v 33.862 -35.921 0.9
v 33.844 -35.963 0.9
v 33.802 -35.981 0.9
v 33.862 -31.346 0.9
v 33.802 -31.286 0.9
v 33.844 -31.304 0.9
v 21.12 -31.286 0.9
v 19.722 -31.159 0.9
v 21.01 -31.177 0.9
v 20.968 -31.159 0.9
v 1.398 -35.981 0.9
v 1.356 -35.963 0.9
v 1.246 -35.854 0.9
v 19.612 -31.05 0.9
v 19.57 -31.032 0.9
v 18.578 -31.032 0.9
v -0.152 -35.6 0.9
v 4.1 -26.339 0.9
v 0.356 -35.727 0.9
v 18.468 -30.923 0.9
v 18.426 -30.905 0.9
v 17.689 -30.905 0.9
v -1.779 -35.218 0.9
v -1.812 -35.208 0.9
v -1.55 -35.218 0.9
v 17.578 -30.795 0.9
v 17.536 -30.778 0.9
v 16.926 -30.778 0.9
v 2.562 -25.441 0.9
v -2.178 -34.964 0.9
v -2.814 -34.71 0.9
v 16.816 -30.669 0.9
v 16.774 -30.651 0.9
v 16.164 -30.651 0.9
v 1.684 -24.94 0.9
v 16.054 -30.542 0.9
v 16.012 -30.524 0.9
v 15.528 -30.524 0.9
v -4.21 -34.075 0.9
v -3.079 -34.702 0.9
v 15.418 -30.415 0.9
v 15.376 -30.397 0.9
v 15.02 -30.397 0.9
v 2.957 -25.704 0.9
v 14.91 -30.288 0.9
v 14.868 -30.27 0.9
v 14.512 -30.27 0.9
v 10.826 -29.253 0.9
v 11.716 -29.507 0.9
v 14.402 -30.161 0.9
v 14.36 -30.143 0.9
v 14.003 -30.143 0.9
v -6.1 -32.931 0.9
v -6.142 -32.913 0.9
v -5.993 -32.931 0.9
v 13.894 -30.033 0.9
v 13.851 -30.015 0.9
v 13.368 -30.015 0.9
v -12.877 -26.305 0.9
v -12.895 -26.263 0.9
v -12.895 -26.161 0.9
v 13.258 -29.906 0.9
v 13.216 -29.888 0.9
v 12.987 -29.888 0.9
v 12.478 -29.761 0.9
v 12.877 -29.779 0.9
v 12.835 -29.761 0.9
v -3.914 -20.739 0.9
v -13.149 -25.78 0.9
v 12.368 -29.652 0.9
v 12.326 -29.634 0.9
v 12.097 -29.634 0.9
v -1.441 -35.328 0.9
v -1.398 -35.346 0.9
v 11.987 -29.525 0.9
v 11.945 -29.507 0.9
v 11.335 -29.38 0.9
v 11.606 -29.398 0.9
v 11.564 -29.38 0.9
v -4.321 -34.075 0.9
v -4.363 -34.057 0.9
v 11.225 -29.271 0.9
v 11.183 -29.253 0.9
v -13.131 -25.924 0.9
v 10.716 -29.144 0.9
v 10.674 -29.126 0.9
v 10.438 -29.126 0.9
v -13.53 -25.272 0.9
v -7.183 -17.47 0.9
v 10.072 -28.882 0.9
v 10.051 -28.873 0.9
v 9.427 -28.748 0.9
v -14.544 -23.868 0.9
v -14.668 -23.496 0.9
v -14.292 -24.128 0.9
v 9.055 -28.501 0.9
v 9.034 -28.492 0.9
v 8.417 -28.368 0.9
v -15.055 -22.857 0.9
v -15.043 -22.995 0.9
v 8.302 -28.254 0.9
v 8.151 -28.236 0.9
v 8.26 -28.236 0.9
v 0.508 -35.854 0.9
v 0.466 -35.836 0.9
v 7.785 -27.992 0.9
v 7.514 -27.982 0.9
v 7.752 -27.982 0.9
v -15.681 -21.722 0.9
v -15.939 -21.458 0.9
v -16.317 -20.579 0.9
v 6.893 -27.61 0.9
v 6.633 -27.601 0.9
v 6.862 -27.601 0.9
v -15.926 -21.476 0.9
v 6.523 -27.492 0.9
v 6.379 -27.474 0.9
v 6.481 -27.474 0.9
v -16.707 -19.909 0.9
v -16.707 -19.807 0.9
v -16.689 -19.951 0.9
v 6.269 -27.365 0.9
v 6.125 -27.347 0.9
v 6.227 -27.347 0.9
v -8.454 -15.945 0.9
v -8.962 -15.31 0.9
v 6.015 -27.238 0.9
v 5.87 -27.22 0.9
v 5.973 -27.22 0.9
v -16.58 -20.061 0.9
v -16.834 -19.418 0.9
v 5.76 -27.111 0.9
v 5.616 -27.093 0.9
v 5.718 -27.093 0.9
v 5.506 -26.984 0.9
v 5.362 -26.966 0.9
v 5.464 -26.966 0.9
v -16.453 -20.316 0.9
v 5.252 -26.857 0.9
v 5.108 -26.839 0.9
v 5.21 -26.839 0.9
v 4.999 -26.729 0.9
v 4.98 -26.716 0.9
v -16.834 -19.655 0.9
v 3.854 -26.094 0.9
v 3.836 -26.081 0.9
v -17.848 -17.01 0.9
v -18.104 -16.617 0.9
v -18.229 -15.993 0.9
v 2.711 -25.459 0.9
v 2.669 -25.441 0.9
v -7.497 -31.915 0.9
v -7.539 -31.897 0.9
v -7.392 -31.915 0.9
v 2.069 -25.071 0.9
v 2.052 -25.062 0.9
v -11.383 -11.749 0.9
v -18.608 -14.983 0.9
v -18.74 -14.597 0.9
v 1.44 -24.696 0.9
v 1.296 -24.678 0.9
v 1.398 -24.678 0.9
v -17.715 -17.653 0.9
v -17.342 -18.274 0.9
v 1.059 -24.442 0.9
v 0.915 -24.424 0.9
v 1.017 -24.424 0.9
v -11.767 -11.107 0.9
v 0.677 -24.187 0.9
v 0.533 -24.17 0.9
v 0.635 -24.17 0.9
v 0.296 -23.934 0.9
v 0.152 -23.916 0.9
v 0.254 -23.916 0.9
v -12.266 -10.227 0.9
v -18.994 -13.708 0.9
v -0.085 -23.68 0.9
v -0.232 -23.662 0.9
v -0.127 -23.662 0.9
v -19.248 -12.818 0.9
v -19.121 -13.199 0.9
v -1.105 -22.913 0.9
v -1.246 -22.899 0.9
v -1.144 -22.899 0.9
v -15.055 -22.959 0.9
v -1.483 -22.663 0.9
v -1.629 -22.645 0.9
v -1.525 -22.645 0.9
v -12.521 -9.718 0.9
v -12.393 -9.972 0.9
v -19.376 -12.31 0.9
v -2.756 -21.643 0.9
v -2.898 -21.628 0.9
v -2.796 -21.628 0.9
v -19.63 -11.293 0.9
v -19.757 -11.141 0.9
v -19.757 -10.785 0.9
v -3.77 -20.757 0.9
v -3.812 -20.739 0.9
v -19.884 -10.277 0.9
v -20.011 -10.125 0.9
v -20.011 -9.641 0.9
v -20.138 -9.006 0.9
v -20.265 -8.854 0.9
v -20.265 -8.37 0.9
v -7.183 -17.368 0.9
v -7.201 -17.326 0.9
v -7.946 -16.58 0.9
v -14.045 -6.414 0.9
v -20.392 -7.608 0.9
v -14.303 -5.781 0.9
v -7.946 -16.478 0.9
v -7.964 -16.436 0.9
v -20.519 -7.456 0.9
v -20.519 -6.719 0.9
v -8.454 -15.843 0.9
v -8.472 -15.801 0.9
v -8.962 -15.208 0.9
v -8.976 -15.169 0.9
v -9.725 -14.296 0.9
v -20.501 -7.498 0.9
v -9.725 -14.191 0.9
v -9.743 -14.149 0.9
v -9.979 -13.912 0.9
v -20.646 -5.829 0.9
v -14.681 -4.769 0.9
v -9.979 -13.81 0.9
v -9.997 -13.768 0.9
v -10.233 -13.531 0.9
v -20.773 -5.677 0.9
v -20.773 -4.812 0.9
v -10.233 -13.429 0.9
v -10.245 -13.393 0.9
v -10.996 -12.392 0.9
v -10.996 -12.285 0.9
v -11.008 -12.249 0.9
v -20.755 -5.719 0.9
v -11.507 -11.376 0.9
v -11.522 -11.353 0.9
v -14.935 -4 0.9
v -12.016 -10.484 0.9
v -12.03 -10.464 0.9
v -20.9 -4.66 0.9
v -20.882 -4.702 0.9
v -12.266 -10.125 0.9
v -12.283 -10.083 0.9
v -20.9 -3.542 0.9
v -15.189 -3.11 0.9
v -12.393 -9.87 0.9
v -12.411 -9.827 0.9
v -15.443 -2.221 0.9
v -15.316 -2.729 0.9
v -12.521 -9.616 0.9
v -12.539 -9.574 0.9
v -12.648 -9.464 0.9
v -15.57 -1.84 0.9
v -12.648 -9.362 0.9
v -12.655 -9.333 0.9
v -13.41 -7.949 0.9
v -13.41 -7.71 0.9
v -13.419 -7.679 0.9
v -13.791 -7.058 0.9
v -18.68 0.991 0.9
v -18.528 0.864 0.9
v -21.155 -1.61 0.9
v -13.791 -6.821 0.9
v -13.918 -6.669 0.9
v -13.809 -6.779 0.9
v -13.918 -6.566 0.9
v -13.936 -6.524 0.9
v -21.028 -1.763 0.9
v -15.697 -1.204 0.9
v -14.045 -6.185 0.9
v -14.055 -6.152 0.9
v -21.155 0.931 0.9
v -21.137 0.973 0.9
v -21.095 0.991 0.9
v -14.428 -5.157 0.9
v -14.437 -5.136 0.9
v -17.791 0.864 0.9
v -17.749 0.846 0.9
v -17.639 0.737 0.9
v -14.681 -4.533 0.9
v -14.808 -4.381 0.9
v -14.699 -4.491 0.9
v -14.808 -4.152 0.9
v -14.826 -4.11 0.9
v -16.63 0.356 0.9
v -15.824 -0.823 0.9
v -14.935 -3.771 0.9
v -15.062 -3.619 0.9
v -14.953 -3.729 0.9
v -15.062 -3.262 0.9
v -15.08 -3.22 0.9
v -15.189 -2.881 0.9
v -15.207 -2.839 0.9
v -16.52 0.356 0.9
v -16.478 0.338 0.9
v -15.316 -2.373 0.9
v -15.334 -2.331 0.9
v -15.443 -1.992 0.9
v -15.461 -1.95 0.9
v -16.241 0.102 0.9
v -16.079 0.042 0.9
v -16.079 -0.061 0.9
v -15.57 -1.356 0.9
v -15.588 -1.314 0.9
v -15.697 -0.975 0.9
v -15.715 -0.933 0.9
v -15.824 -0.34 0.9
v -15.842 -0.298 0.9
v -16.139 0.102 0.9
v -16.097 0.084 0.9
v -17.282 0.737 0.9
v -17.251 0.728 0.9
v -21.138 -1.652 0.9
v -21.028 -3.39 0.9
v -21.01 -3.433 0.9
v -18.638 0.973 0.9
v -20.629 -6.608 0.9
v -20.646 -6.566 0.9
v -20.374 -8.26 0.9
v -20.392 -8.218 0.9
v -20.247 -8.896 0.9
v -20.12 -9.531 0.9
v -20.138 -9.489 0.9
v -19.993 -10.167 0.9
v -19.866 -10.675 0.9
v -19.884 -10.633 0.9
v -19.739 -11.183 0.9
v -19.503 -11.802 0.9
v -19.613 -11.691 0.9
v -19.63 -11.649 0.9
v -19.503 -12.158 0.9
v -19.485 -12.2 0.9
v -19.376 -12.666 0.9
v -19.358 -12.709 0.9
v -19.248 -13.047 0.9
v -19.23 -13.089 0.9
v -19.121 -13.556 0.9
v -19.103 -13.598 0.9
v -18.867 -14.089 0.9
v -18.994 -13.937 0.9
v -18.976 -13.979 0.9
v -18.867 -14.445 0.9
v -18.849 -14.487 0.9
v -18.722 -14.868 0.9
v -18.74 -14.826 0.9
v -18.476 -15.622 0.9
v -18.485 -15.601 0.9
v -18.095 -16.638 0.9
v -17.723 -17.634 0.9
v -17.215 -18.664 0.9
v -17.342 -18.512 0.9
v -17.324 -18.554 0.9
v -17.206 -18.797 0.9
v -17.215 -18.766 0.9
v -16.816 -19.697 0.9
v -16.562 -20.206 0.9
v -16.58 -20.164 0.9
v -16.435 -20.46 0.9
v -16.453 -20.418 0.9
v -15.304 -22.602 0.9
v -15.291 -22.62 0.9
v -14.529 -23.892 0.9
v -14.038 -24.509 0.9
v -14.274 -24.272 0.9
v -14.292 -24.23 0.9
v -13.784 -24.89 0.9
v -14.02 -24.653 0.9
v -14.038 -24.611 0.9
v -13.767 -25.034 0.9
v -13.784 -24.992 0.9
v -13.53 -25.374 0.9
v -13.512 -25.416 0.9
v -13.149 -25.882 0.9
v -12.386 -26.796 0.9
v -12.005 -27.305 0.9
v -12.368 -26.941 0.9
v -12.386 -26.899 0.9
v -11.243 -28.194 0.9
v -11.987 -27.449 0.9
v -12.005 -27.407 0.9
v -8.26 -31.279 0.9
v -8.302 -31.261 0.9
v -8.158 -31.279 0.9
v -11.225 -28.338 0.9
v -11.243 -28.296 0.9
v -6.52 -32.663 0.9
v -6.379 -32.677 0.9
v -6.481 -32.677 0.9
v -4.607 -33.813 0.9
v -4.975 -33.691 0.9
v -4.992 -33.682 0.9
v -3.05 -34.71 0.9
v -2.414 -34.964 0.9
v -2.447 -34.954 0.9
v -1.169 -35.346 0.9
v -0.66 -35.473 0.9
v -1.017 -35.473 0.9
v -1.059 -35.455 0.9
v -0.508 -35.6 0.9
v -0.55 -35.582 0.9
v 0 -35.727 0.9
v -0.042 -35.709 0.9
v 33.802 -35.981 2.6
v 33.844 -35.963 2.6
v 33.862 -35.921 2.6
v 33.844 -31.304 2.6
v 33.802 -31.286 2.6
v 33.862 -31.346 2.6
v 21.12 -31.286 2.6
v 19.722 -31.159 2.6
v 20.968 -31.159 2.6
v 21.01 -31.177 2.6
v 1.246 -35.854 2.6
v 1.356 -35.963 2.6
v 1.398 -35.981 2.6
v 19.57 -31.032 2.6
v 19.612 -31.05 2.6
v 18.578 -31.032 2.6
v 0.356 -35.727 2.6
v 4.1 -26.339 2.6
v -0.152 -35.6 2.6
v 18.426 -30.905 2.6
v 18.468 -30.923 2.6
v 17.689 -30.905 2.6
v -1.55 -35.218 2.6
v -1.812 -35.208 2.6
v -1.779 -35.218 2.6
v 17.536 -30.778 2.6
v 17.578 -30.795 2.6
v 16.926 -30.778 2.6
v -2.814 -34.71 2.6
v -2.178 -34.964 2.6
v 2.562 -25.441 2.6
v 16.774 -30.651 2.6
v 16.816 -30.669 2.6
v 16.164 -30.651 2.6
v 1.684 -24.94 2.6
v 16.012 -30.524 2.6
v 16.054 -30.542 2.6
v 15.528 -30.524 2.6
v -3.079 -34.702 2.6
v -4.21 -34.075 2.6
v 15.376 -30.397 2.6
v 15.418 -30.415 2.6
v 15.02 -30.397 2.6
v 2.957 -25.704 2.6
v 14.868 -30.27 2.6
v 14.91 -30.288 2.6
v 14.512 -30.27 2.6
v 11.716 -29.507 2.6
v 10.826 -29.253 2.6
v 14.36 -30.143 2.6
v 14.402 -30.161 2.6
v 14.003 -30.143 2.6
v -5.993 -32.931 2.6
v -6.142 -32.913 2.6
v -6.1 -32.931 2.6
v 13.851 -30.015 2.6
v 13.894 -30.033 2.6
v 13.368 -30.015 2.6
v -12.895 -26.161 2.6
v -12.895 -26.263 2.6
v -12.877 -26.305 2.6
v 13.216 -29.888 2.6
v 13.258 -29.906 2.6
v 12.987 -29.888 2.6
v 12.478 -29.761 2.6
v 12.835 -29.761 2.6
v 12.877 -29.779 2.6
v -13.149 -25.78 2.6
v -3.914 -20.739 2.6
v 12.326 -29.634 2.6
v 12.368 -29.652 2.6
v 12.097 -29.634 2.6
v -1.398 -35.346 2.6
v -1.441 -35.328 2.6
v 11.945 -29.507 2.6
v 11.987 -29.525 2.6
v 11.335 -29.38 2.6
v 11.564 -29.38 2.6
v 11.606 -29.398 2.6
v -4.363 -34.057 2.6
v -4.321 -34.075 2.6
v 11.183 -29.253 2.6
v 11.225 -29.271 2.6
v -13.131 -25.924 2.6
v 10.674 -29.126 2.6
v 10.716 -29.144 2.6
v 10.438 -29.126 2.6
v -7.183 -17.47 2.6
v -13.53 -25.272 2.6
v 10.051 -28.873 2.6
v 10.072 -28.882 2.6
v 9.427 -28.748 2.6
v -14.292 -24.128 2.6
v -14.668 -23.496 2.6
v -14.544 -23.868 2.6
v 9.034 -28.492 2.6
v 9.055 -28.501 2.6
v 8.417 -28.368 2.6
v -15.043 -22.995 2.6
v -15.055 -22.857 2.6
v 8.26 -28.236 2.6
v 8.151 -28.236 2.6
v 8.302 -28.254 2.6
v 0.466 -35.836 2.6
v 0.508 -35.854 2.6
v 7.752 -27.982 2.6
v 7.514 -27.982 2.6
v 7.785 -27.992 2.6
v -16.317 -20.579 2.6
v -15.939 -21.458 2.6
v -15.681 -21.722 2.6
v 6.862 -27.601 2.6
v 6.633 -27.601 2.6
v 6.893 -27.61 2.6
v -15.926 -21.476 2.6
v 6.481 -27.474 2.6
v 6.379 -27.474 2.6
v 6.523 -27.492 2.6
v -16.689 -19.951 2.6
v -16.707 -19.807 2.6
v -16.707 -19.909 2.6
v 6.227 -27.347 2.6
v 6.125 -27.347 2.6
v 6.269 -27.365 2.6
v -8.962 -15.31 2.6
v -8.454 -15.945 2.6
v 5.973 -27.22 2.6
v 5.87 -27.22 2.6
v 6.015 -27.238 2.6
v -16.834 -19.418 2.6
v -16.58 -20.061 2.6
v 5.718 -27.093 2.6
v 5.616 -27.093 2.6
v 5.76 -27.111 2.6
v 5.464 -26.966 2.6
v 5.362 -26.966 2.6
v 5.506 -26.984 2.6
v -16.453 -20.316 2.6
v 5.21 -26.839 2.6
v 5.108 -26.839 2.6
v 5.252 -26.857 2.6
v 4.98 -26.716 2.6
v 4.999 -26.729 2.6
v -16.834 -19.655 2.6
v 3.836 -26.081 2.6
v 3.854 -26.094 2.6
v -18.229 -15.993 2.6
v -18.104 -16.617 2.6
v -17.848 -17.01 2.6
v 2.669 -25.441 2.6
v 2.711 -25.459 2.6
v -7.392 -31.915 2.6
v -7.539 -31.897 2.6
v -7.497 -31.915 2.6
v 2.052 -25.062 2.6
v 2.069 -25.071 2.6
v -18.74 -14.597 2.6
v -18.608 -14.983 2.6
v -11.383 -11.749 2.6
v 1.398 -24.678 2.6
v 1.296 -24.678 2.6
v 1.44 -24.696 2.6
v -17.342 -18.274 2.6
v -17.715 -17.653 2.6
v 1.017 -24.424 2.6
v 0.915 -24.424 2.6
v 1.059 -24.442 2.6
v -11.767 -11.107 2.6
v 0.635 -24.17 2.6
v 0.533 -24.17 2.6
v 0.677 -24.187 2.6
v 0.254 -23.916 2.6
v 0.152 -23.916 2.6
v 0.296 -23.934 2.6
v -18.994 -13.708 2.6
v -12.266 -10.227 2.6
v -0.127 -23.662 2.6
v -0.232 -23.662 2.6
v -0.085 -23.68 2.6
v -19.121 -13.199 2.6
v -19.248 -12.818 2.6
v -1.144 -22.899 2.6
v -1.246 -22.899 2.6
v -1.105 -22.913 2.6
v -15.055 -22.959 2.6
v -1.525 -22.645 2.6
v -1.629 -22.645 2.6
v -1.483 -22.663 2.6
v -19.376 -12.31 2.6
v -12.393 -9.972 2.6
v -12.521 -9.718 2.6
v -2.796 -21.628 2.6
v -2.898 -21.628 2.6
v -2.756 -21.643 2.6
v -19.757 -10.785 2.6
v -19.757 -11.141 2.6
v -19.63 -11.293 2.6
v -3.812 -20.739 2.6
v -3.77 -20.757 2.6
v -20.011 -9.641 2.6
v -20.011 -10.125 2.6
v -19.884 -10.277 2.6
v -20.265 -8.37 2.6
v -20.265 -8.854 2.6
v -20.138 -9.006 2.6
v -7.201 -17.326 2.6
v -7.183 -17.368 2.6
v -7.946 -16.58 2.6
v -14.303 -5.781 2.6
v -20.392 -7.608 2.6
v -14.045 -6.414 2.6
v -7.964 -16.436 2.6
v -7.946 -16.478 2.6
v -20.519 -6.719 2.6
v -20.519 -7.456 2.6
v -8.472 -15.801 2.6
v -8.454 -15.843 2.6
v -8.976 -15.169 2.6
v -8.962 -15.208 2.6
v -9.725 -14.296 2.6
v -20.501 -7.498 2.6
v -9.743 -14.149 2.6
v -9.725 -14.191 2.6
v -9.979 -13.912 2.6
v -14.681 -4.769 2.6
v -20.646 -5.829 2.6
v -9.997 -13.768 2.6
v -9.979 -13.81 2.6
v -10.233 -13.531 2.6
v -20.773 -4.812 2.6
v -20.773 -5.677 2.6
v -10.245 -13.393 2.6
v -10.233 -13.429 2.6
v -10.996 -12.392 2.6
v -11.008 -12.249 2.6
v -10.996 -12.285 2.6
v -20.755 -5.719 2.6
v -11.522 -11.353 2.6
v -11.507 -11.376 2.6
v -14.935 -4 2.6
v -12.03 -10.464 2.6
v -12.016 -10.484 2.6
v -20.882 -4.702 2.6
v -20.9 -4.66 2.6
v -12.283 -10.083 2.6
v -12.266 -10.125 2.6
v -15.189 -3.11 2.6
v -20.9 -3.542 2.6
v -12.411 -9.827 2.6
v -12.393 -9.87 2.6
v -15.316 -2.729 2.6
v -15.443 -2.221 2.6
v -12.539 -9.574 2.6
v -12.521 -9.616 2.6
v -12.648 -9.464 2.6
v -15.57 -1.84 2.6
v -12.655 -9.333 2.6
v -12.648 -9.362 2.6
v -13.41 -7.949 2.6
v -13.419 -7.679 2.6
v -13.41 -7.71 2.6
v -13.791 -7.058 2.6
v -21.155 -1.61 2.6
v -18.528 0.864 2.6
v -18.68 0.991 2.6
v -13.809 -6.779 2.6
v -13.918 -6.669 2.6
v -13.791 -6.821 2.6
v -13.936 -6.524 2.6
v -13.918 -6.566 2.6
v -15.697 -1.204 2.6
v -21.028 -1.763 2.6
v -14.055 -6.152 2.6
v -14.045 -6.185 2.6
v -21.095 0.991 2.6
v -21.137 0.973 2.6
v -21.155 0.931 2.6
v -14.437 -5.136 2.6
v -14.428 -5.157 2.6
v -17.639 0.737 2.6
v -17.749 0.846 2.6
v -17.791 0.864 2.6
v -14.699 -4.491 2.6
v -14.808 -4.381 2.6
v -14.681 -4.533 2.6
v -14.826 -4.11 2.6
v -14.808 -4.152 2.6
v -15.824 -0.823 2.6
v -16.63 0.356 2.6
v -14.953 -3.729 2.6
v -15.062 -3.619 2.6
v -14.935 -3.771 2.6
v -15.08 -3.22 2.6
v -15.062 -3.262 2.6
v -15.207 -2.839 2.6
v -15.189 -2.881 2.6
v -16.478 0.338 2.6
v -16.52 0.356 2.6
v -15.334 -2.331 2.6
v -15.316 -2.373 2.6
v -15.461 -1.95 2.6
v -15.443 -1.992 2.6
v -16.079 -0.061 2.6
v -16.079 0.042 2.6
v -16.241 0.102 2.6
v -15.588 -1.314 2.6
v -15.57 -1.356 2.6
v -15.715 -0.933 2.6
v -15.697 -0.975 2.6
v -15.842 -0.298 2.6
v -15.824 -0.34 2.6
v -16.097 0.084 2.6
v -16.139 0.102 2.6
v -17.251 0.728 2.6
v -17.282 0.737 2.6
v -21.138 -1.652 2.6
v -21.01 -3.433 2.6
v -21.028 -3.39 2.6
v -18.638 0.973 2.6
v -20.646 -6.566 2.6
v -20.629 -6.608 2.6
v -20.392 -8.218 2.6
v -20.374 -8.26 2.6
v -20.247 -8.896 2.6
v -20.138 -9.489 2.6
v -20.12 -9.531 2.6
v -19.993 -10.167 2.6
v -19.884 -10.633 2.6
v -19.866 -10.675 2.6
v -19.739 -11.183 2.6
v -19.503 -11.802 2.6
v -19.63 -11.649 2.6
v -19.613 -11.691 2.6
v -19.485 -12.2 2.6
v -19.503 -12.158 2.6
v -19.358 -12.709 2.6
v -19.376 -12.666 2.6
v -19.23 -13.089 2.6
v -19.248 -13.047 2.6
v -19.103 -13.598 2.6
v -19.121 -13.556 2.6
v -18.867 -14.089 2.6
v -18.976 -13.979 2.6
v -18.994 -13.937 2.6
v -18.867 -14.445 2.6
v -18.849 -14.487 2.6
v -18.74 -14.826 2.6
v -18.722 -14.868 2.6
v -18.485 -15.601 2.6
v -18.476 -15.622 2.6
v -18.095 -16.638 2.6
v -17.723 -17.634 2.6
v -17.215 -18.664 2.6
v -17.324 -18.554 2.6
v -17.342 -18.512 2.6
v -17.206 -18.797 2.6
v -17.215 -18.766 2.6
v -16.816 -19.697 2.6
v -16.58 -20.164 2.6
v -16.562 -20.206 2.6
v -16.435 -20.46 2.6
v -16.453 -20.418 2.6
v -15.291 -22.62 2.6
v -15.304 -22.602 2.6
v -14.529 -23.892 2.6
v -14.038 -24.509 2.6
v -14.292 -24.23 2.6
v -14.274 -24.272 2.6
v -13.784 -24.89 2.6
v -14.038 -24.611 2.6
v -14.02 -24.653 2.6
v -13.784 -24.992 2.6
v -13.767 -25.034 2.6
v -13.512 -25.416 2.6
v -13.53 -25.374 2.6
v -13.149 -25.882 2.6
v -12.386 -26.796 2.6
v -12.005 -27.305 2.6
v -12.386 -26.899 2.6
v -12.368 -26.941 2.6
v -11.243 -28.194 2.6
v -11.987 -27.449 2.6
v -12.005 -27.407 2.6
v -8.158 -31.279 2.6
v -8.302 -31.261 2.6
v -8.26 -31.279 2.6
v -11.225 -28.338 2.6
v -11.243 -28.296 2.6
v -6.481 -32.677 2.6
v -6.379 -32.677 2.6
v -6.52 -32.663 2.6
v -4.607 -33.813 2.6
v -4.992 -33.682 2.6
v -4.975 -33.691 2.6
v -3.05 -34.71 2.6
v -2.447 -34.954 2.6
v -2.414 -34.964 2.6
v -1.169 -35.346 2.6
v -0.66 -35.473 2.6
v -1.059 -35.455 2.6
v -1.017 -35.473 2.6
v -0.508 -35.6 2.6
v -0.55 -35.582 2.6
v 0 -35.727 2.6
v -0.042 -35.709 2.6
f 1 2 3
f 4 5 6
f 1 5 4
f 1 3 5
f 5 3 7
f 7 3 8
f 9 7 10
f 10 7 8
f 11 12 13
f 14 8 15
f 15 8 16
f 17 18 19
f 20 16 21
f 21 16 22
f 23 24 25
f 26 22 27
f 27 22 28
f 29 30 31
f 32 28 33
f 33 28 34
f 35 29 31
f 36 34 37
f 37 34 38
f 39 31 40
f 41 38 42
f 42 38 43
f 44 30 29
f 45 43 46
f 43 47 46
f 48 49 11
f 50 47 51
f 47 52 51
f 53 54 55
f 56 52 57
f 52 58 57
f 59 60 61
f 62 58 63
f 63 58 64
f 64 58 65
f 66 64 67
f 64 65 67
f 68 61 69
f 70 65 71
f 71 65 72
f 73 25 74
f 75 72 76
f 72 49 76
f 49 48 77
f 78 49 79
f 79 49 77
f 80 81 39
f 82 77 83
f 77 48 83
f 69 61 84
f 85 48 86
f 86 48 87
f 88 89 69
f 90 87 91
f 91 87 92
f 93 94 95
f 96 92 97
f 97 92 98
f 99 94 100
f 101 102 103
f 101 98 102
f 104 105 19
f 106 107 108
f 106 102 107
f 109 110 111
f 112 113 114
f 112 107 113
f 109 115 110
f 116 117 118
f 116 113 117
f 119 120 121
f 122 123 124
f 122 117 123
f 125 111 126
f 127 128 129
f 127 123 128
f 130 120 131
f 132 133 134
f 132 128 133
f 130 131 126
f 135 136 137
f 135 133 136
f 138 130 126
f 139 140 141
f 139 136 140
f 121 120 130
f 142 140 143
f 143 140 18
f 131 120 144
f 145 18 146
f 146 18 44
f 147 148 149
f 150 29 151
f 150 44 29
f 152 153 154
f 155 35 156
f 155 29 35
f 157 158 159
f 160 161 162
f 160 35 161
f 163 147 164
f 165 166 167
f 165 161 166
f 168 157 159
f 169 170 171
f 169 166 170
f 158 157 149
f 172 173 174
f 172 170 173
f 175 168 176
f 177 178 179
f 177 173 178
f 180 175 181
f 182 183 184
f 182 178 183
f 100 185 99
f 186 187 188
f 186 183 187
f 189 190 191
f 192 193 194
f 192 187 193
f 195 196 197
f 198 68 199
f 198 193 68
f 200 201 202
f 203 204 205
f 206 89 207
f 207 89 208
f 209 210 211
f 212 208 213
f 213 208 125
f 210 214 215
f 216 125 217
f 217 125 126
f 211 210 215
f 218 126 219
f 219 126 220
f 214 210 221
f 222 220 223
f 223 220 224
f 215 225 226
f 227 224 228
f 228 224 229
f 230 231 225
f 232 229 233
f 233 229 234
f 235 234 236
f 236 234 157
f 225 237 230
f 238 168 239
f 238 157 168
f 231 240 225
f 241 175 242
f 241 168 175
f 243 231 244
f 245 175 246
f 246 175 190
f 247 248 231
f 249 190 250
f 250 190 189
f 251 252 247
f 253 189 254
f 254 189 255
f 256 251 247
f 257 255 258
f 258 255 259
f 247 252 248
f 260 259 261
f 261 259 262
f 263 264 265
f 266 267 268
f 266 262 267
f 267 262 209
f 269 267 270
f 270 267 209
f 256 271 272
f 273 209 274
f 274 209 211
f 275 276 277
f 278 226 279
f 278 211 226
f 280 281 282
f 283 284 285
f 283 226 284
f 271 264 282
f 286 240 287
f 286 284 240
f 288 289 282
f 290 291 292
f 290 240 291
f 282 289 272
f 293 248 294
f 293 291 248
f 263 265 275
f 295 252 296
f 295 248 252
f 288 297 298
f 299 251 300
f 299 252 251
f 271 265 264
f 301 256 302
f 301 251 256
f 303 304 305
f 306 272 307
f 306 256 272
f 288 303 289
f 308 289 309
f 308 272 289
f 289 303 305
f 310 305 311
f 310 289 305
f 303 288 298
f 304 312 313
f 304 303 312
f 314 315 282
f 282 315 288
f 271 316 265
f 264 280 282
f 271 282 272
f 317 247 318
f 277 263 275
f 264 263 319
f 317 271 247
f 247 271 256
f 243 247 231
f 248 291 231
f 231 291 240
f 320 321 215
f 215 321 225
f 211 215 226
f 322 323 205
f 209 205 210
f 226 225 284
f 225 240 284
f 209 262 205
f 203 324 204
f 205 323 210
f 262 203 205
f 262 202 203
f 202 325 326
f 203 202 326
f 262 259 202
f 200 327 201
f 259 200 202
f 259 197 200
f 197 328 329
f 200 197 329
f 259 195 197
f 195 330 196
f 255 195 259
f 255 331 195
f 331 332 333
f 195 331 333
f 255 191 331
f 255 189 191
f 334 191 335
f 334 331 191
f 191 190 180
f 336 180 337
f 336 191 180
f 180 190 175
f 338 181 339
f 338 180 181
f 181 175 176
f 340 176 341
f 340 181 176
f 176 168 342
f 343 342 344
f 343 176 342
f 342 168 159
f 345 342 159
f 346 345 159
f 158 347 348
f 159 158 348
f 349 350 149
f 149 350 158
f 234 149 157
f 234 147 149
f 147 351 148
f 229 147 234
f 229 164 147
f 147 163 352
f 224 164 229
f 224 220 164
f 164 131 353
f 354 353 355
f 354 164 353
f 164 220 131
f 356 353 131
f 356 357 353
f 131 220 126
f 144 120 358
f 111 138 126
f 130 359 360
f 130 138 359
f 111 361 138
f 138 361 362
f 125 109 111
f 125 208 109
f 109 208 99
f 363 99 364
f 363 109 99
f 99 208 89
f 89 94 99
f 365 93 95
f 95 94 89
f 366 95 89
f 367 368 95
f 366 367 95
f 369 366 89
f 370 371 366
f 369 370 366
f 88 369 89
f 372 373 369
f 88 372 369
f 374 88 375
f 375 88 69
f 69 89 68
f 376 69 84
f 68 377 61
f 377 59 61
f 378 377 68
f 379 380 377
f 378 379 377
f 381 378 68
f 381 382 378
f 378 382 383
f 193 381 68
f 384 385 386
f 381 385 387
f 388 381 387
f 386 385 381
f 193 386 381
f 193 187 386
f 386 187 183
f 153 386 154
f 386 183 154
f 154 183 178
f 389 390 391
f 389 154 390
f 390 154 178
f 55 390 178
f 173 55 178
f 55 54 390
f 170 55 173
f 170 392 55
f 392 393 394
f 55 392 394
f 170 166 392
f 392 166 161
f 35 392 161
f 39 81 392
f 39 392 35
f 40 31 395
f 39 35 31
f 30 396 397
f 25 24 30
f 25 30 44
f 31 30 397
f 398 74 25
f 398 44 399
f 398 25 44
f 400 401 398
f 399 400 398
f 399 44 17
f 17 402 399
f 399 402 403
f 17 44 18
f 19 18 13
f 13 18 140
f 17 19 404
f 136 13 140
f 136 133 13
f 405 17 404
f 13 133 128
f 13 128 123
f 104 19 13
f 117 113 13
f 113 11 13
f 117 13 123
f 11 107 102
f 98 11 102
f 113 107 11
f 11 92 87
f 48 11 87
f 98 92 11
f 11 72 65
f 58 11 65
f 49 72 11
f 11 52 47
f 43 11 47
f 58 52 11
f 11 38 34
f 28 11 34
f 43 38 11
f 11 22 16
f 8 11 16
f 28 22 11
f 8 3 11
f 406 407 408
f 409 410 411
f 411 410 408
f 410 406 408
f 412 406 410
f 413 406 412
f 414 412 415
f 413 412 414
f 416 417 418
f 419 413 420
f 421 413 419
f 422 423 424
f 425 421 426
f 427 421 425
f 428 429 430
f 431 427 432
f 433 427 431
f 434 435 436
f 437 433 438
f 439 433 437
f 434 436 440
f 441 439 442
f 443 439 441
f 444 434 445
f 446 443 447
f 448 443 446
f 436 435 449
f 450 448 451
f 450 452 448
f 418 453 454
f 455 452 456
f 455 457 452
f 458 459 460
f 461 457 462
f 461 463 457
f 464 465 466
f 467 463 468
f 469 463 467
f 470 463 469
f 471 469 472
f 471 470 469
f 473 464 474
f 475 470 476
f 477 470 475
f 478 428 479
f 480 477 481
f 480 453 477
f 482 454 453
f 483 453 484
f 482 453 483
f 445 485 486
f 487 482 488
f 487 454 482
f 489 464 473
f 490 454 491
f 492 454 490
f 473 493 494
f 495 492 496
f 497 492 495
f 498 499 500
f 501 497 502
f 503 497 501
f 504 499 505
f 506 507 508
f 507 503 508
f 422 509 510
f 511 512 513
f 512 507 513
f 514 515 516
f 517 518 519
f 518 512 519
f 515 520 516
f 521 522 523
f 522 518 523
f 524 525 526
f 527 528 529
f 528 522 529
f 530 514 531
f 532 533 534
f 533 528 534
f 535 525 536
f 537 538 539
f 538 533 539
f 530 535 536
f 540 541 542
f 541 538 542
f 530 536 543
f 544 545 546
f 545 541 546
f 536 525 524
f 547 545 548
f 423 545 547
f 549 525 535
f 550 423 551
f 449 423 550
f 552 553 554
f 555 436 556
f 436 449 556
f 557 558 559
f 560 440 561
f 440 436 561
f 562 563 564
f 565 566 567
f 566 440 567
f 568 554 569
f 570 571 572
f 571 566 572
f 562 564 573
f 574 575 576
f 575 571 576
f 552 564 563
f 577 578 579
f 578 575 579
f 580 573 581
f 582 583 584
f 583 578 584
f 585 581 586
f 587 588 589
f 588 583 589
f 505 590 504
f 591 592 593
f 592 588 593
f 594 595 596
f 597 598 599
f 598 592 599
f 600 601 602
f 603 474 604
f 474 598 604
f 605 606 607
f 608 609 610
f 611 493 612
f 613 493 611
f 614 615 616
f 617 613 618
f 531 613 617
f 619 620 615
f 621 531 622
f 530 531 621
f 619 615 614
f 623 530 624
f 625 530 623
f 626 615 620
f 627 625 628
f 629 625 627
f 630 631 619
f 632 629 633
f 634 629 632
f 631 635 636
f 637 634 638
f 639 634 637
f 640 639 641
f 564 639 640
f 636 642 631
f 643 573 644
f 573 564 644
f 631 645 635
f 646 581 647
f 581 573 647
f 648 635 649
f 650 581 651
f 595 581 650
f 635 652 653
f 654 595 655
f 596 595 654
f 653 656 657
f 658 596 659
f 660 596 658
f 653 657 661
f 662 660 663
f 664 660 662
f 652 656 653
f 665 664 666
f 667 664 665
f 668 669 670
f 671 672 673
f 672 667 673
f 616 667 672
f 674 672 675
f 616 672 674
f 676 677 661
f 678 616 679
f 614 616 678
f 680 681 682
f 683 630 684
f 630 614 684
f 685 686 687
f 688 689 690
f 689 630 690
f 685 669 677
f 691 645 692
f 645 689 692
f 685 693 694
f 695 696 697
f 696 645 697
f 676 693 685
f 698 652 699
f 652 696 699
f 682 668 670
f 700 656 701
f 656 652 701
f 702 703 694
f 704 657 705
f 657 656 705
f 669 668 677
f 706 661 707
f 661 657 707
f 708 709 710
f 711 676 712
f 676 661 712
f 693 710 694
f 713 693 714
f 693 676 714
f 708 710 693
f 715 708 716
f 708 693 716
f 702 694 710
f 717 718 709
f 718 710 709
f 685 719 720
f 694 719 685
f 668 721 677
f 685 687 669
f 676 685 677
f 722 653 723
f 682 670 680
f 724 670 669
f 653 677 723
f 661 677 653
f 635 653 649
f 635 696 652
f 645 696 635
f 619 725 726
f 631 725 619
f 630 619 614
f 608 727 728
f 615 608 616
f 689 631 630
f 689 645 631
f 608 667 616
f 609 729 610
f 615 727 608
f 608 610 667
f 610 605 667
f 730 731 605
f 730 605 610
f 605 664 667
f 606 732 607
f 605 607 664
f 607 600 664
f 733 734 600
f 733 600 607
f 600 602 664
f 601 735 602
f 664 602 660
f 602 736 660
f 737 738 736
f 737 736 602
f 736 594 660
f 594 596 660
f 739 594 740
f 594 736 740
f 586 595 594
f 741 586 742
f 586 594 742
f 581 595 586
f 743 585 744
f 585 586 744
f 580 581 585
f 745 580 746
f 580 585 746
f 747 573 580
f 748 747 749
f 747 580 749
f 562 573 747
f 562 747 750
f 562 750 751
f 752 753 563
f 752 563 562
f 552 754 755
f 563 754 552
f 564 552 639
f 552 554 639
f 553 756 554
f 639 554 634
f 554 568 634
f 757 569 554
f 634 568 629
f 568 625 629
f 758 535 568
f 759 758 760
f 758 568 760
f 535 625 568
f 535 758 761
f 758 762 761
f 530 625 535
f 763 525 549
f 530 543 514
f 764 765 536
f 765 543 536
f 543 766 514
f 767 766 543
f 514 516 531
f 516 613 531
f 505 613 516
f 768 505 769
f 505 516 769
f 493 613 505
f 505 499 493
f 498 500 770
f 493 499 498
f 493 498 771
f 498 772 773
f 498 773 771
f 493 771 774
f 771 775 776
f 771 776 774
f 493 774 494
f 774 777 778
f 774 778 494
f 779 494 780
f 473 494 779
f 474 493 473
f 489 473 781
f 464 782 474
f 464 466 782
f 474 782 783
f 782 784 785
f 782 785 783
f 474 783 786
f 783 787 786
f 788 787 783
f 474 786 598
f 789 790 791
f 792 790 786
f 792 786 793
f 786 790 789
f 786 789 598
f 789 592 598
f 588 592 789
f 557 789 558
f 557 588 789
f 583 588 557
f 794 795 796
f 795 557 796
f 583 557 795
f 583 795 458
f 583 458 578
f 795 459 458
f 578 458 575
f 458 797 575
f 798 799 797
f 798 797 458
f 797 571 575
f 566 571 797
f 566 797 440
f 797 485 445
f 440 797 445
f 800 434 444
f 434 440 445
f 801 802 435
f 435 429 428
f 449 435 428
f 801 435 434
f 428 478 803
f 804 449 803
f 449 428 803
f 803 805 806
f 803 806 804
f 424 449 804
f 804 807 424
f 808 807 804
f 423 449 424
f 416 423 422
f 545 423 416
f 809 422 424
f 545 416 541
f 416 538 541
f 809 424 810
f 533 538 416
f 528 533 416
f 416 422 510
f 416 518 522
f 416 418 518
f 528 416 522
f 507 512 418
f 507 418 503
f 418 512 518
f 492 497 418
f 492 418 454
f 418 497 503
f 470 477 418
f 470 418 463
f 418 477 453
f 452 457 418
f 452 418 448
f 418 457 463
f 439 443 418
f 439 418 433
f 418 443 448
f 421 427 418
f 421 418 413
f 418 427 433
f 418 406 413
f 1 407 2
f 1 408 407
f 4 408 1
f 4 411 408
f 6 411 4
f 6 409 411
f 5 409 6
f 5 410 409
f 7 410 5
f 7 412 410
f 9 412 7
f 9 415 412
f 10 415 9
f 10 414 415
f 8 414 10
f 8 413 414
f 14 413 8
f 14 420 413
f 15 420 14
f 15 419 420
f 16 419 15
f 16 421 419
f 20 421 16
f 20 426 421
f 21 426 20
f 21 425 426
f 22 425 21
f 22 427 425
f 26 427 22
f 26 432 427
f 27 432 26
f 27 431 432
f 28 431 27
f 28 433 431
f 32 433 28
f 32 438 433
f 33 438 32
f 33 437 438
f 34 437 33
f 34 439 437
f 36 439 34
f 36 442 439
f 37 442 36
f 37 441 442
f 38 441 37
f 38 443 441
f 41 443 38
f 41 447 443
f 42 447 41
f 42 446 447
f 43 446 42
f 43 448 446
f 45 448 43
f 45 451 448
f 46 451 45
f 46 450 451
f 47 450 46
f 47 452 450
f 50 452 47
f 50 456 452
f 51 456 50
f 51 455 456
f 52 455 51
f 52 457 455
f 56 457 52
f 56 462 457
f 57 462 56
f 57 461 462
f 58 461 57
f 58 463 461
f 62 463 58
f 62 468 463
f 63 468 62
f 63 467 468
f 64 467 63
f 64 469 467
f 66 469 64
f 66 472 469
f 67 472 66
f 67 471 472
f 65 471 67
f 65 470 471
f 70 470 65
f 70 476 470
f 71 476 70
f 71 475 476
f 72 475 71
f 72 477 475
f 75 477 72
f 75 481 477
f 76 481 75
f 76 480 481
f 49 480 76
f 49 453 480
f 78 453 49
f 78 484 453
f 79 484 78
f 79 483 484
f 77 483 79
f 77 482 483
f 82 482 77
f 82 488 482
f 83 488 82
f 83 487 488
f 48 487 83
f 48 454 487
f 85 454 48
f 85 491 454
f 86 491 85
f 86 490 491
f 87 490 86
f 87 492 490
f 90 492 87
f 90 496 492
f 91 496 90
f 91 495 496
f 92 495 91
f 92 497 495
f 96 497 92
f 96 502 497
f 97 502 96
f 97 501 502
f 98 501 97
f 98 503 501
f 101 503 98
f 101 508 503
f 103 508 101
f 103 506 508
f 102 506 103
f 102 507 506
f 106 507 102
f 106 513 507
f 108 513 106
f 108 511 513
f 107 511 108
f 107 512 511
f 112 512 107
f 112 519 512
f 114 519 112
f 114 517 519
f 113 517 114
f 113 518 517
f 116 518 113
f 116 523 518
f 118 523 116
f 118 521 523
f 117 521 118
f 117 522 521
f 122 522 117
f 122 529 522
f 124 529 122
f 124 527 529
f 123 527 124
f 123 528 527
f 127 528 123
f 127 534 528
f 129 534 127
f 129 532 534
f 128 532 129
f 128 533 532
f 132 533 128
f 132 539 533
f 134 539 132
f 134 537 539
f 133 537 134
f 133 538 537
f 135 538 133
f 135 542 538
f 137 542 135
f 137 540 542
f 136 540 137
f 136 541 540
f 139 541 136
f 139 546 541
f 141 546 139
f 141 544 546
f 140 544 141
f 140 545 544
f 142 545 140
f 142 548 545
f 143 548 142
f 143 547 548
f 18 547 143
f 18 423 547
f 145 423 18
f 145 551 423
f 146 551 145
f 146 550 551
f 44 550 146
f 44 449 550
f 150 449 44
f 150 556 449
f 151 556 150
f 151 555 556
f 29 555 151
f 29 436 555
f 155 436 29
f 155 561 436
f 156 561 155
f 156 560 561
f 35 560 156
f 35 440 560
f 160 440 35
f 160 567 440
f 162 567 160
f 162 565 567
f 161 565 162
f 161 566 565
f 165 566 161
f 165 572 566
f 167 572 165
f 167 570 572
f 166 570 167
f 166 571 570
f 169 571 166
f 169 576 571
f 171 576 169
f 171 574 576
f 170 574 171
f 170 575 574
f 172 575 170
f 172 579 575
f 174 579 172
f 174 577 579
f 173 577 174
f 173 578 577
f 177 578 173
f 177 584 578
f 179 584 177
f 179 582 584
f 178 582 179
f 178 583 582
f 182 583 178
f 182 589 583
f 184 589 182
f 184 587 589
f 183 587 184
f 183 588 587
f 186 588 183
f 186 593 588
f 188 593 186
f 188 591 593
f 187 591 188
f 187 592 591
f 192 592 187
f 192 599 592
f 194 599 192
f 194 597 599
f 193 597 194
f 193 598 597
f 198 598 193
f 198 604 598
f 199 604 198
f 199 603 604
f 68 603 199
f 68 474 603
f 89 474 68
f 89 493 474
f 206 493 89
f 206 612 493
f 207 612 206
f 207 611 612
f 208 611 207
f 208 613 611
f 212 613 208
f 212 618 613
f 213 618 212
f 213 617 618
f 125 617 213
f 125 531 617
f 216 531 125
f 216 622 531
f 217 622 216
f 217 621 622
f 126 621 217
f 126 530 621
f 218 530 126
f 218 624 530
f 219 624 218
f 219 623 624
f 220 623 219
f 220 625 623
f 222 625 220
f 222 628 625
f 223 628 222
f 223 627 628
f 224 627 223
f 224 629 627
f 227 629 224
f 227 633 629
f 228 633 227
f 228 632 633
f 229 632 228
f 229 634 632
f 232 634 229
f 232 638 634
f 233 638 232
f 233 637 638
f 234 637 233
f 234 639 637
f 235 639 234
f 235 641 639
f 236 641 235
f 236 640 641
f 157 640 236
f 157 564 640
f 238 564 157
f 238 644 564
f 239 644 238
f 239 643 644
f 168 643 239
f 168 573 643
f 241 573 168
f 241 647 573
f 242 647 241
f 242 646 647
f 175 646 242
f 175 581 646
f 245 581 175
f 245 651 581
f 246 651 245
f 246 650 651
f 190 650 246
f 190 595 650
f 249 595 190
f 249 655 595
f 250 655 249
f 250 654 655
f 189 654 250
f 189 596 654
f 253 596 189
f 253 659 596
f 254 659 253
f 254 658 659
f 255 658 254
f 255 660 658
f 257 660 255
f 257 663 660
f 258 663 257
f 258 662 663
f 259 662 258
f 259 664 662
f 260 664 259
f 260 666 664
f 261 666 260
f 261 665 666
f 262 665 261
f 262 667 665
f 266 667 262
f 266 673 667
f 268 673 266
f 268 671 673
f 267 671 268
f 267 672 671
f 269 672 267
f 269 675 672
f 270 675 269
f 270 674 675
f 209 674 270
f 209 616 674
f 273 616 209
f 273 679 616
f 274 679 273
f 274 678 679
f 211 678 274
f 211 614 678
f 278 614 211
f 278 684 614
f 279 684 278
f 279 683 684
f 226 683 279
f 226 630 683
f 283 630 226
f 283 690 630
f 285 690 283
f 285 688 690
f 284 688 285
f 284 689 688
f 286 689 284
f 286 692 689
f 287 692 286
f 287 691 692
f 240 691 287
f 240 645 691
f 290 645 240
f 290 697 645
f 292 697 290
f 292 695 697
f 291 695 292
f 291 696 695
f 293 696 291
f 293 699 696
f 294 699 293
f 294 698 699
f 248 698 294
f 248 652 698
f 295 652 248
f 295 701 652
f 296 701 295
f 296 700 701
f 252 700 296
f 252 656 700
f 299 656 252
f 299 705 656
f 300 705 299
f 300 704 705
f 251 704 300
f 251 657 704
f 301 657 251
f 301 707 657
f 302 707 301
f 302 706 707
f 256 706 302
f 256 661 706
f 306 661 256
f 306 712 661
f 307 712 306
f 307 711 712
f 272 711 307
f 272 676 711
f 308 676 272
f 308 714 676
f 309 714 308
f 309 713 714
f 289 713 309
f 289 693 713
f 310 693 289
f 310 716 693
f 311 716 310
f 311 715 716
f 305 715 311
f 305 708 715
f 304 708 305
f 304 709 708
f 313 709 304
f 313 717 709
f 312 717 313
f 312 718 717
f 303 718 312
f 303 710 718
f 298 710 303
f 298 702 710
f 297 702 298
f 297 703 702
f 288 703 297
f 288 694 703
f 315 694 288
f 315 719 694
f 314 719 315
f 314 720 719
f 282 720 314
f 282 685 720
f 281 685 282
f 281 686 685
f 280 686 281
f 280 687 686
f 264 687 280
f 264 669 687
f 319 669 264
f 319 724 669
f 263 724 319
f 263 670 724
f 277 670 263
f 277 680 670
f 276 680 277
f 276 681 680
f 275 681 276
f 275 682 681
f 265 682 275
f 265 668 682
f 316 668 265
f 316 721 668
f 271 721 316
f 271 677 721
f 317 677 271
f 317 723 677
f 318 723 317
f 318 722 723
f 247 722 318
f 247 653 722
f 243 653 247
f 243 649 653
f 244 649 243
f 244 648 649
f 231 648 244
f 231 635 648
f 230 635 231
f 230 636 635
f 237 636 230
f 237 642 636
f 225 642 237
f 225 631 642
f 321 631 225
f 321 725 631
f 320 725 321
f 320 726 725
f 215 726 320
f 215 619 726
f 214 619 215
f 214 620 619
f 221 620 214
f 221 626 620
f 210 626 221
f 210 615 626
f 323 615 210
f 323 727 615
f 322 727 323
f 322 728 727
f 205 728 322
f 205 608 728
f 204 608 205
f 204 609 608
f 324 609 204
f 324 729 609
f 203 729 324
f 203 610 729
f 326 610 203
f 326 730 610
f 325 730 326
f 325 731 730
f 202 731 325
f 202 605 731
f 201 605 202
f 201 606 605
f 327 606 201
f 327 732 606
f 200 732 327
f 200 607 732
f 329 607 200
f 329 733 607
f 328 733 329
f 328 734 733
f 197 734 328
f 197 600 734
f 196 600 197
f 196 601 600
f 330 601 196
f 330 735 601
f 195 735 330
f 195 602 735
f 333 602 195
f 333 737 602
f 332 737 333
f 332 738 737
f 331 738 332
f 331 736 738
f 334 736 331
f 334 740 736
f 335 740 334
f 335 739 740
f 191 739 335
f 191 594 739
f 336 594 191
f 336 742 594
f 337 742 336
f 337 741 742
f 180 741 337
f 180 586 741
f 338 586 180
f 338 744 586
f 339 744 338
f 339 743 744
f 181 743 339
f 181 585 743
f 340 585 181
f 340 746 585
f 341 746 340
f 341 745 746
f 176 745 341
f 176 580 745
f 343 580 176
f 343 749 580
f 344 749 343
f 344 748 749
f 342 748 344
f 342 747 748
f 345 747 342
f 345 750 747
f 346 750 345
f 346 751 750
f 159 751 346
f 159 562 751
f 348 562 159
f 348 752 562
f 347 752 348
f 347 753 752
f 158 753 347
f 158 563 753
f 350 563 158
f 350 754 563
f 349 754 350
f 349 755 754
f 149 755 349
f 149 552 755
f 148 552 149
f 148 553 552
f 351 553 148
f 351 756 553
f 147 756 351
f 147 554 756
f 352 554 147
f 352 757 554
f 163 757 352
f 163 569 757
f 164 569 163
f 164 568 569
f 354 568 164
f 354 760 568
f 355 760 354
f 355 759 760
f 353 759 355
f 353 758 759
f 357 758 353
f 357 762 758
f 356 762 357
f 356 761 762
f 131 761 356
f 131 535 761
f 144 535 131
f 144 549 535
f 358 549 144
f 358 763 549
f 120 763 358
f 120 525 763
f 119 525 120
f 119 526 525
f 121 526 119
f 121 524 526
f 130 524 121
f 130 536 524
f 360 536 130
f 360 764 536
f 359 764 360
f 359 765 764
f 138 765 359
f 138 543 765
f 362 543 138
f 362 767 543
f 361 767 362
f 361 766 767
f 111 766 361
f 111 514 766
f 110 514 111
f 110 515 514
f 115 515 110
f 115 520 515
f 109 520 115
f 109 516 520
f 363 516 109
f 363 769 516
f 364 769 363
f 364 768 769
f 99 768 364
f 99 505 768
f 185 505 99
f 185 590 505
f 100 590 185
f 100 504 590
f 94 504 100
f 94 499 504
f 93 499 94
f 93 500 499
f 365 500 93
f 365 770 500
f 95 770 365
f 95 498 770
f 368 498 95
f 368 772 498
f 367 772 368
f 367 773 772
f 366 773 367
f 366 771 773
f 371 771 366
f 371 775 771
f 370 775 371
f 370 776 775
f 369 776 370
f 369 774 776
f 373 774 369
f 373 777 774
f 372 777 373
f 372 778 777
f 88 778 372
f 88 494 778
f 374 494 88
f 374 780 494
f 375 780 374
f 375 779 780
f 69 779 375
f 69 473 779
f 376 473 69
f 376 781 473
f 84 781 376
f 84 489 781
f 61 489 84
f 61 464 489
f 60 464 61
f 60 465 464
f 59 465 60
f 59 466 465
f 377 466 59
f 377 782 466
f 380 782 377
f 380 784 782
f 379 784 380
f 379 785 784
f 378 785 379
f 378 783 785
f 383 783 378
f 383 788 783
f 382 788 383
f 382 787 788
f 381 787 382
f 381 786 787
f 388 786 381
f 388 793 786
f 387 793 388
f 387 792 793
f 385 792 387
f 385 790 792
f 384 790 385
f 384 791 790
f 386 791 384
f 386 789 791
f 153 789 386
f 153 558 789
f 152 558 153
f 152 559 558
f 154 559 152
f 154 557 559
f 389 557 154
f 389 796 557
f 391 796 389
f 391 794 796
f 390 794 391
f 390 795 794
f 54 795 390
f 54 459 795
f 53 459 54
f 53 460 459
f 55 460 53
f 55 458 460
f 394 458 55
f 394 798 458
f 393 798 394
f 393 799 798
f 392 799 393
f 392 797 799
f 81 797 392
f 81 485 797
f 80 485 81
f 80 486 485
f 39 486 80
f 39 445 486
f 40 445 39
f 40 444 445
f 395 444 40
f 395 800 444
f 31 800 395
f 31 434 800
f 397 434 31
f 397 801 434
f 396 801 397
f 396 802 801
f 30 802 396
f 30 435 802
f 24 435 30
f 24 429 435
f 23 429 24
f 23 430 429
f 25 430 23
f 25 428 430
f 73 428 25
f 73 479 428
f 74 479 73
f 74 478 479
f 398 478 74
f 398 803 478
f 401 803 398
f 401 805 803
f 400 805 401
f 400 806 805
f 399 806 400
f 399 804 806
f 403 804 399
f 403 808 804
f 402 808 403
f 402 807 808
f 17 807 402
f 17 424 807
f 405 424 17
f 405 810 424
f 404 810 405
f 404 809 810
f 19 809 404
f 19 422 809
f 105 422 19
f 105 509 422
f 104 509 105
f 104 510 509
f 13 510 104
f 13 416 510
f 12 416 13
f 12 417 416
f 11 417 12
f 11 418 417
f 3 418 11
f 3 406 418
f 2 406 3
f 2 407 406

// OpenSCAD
$fn = 24;
translate([0, -2.500, 0.900])
  linear_extrude(height=1.700) {
offset(r=0.06, $fn=8) {
    polygon(points=[[-21.095,3.431],[-21.095,0.890],[-20.968,0.762],[-20.968,-0.890],[-20.840,-1.017],[-20.840,-2.160],[-20.713,-2.287],[-20.713,-3.177],[-20.586,-3.304],[-20.586,-4.066],[-20.459,-4.194],[-20.459,-4.956],[-20.332,-5.083],[-20.332,-5.718],[-20.205,-5.845],[-20.205,-6.354],[-20.078,-6.481],[-20.078,-6.989],[-19.951,-7.116],[-19.951,-7.625],[-19.824,-7.752],[-19.824,-8.133],[-19.697,-8.260],[-19.697,-8.641],[-19.570,-8.768],[-19.570,-9.149],[-19.443,-9.277],[-19.443,-9.658],[-19.316,-9.785],[-19.316,-10.166],[-19.188,-10.293],[-19.188,-10.547],[-19.061,-10.674],[-19.061,-11.056],[-18.934,-11.183],[-18.934,-11.437],[-18.807,-11.564],[-18.807,-11.945],[-18.680,-12.072],[-18.680,-12.326],[-18.553,-12.453],[-18.426,-13.089],[-18.172,-13.470],[-18.045,-14.105],[-17.791,-14.487],[-17.664,-15.122],[-17.282,-15.757],[-17.282,-16.012],[-17.155,-16.139],[-17.155,-16.266],[-16.774,-16.901],[-16.774,-17.155],[-16.647,-17.282],[-16.647,-17.409],[-16.520,-17.536],[-16.520,-17.664],[-16.393,-17.791],[-16.393,-17.918],[-16.266,-18.045],[-15.884,-18.934],[-15.630,-19.188],[-15.249,-20.078],[-14.995,-20.332],[-14.995,-20.459],[-14.614,-20.968],[-14.487,-21.349],[-14.232,-21.603],[-14.232,-21.730],[-13.978,-21.984],[-13.978,-22.111],[-13.724,-22.365],[-13.724,-22.492],[-13.470,-22.747],[-13.470,-22.874],[-13.089,-23.255],[-13.089,-23.382],[-12.835,-23.636],[-12.835,-23.763],[-12.326,-24.271],[-12.326,-24.399],[-11.945,-24.780],[-11.945,-24.907],[-11.183,-25.669],[-11.183,-25.796],[-8.260,-28.719],[-8.133,-28.719],[-7.497,-29.355],[-7.370,-29.355],[-6.481,-30.117],[-6.354,-30.117],[-6.100,-30.371],[-5.973,-30.371],[-4.956,-31.134],[-4.575,-31.261],[-4.321,-31.515],[-4.194,-31.515],[-3.050,-32.150],[-2.796,-32.150],[-2.414,-32.404],[-2.160,-32.404],[-1.779,-32.658],[-1.525,-32.658],[-1.398,-32.786],[-1.144,-32.786],[-1.017,-32.913],[-0.635,-32.913],[-0.508,-33.040],[-0.127,-33.040],[0.000,-33.167],[0.381,-33.167],[0.508,-33.294],[1.271,-33.294],[1.398,-33.421],[33.802,-33.421],[33.802,-28.846],[21.095,-28.846],[20.968,-28.719],[19.697,-28.719],[19.570,-28.592],[18.553,-28.592],[18.426,-28.465],[17.664,-28.465],[17.536,-28.338],[16.901,-28.338],[16.774,-28.211],[16.139,-28.211],[16.012,-28.084],[15.503,-28.084],[15.376,-27.957],[14.995,-27.957],[14.868,-27.830],[14.487,-27.830],[14.360,-27.703],[13.978,-27.703],[13.851,-27.575],[13.343,-27.575],[13.216,-27.448],[12.962,-27.448],[12.835,-27.321],[12.453,-27.321],[12.326,-27.194],[12.072,-27.194],[11.945,-27.067],[11.691,-27.067],[11.564,-26.940],[11.310,-26.940],[11.183,-26.813],[10.801,-26.813],[10.674,-26.686],[10.420,-26.686],[10.039,-26.432],[9.404,-26.305],[9.022,-26.051],[8.387,-25.923],[8.260,-25.796],[8.133,-25.796],[7.752,-25.542],[7.497,-25.542],[6.862,-25.161],[6.608,-25.161],[6.481,-25.034],[6.354,-25.034],[6.227,-24.907],[6.100,-24.907],[5.973,-24.780],[5.845,-24.780],[5.718,-24.653],[5.591,-24.653],[5.464,-24.526],[5.337,-24.526],[5.210,-24.399],[5.083,-24.399],[4.956,-24.271],[4.066,-23.890],[3.812,-23.636],[2.923,-23.255],[2.669,-23.001],[2.542,-23.001],[2.033,-22.619],[1.652,-22.492],[1.398,-22.238],[1.271,-22.238],[1.017,-21.984],[0.890,-21.984],[0.635,-21.730],[0.508,-21.730],[0.254,-21.476],[0.127,-21.476],[-0.127,-21.222],[-0.254,-21.222],[-1.144,-20.459],[-1.271,-20.459],[-1.525,-20.205],[-1.652,-20.205],[-2.796,-19.188],[-2.923,-19.188],[-3.812,-18.299],[-3.939,-18.299],[-7.243,-14.995],[-7.243,-14.868],[-8.006,-14.105],[-8.006,-13.978],[-8.514,-13.470],[-8.514,-13.343],[-9.022,-12.835],[-9.022,-12.708],[-9.785,-11.818],[-9.785,-11.691],[-10.039,-11.437],[-10.039,-11.310],[-10.293,-11.056],[-10.293,-10.929],[-11.056,-9.912],[-11.056,-9.785],[-11.437,-9.277],[-11.564,-8.895],[-11.818,-8.641],[-12.072,-8.006],[-12.326,-7.752],[-12.326,-7.625],[-12.453,-7.497],[-12.453,-7.370],[-12.581,-7.243],[-12.581,-7.116],[-12.708,-6.989],[-12.708,-6.862],[-13.470,-5.464],[-13.470,-5.210],[-13.851,-4.575],[-13.851,-4.321],[-13.978,-4.194],[-13.978,-4.066],[-14.105,-3.939],[-14.105,-3.685],[-14.360,-3.304],[-14.487,-2.669],[-14.741,-2.287],[-14.741,-2.033],[-14.868,-1.906],[-14.868,-1.652],[-14.995,-1.525],[-14.995,-1.271],[-15.122,-1.144],[-15.122,-0.762],[-15.249,-0.635],[-15.249,-0.381],[-15.376,-0.254],[-15.376,0.127],[-15.503,0.254],[-15.503,0.508],[-15.630,0.635],[-15.630,1.144],[-15.757,1.271],[-15.757,1.525],[-15.884,1.652],[-15.884,2.160],[-16.139,2.414],[-16.139,2.542],[-16.266,2.542],[-16.520,2.796],[-16.647,2.796],[-17.282,3.177],[-17.664,3.177],[-17.791,3.304],[-18.553,3.304],[-18.680,3.431]], paths=[[0,1,2,3,4,5,6,7,8,9,10,11,12,13,14,15,16,17,18,19,20,21,22,23,24,25,26,27,28,29,30,31,32,33,34,35,36,37,38,39,40,41,42,43,44,45,46,47,48,49,50,51,52,53,54,55,56,57,58,59,60,61,62,63,64,65,66,67,68,69,70,71,72,73,74,75,76,77,78,79,80,81,82,83,84,85,86,87,88,89,90,91,92,93,94,95,96,97,98,99,100,101,102,103,104,105,106,107,108,109,110,111,112,113,114,115,116,117,118,119,120,121,122,123,124,125,126,127,128,129,130,131,132,133,134,135,136,137,138,139,140,141,142,143,144,145,146,147,148,149,150,151,152,153,154,155,156,157,158,159,160,161,162,163,164,165,166,167,168,169,170,171,172,173,174,175,176,177,178,179,180,181,182,183,184,185,186,187,188,189,190,191,192,193,194,195,196,197,198,199,200,201,202,203,204,205,206,207,208,209,210,211,212,213,214,215,216,217,218,219,220,221,222,223,224,225,226,227,228,229,230,231,232,233,234,235,236,237,238,239,240,241,242,243,244,245,246,247,248,249,250,251,252,253,254,255,256,257,258,259,260,261,262,263,264,265]]);
}
}
